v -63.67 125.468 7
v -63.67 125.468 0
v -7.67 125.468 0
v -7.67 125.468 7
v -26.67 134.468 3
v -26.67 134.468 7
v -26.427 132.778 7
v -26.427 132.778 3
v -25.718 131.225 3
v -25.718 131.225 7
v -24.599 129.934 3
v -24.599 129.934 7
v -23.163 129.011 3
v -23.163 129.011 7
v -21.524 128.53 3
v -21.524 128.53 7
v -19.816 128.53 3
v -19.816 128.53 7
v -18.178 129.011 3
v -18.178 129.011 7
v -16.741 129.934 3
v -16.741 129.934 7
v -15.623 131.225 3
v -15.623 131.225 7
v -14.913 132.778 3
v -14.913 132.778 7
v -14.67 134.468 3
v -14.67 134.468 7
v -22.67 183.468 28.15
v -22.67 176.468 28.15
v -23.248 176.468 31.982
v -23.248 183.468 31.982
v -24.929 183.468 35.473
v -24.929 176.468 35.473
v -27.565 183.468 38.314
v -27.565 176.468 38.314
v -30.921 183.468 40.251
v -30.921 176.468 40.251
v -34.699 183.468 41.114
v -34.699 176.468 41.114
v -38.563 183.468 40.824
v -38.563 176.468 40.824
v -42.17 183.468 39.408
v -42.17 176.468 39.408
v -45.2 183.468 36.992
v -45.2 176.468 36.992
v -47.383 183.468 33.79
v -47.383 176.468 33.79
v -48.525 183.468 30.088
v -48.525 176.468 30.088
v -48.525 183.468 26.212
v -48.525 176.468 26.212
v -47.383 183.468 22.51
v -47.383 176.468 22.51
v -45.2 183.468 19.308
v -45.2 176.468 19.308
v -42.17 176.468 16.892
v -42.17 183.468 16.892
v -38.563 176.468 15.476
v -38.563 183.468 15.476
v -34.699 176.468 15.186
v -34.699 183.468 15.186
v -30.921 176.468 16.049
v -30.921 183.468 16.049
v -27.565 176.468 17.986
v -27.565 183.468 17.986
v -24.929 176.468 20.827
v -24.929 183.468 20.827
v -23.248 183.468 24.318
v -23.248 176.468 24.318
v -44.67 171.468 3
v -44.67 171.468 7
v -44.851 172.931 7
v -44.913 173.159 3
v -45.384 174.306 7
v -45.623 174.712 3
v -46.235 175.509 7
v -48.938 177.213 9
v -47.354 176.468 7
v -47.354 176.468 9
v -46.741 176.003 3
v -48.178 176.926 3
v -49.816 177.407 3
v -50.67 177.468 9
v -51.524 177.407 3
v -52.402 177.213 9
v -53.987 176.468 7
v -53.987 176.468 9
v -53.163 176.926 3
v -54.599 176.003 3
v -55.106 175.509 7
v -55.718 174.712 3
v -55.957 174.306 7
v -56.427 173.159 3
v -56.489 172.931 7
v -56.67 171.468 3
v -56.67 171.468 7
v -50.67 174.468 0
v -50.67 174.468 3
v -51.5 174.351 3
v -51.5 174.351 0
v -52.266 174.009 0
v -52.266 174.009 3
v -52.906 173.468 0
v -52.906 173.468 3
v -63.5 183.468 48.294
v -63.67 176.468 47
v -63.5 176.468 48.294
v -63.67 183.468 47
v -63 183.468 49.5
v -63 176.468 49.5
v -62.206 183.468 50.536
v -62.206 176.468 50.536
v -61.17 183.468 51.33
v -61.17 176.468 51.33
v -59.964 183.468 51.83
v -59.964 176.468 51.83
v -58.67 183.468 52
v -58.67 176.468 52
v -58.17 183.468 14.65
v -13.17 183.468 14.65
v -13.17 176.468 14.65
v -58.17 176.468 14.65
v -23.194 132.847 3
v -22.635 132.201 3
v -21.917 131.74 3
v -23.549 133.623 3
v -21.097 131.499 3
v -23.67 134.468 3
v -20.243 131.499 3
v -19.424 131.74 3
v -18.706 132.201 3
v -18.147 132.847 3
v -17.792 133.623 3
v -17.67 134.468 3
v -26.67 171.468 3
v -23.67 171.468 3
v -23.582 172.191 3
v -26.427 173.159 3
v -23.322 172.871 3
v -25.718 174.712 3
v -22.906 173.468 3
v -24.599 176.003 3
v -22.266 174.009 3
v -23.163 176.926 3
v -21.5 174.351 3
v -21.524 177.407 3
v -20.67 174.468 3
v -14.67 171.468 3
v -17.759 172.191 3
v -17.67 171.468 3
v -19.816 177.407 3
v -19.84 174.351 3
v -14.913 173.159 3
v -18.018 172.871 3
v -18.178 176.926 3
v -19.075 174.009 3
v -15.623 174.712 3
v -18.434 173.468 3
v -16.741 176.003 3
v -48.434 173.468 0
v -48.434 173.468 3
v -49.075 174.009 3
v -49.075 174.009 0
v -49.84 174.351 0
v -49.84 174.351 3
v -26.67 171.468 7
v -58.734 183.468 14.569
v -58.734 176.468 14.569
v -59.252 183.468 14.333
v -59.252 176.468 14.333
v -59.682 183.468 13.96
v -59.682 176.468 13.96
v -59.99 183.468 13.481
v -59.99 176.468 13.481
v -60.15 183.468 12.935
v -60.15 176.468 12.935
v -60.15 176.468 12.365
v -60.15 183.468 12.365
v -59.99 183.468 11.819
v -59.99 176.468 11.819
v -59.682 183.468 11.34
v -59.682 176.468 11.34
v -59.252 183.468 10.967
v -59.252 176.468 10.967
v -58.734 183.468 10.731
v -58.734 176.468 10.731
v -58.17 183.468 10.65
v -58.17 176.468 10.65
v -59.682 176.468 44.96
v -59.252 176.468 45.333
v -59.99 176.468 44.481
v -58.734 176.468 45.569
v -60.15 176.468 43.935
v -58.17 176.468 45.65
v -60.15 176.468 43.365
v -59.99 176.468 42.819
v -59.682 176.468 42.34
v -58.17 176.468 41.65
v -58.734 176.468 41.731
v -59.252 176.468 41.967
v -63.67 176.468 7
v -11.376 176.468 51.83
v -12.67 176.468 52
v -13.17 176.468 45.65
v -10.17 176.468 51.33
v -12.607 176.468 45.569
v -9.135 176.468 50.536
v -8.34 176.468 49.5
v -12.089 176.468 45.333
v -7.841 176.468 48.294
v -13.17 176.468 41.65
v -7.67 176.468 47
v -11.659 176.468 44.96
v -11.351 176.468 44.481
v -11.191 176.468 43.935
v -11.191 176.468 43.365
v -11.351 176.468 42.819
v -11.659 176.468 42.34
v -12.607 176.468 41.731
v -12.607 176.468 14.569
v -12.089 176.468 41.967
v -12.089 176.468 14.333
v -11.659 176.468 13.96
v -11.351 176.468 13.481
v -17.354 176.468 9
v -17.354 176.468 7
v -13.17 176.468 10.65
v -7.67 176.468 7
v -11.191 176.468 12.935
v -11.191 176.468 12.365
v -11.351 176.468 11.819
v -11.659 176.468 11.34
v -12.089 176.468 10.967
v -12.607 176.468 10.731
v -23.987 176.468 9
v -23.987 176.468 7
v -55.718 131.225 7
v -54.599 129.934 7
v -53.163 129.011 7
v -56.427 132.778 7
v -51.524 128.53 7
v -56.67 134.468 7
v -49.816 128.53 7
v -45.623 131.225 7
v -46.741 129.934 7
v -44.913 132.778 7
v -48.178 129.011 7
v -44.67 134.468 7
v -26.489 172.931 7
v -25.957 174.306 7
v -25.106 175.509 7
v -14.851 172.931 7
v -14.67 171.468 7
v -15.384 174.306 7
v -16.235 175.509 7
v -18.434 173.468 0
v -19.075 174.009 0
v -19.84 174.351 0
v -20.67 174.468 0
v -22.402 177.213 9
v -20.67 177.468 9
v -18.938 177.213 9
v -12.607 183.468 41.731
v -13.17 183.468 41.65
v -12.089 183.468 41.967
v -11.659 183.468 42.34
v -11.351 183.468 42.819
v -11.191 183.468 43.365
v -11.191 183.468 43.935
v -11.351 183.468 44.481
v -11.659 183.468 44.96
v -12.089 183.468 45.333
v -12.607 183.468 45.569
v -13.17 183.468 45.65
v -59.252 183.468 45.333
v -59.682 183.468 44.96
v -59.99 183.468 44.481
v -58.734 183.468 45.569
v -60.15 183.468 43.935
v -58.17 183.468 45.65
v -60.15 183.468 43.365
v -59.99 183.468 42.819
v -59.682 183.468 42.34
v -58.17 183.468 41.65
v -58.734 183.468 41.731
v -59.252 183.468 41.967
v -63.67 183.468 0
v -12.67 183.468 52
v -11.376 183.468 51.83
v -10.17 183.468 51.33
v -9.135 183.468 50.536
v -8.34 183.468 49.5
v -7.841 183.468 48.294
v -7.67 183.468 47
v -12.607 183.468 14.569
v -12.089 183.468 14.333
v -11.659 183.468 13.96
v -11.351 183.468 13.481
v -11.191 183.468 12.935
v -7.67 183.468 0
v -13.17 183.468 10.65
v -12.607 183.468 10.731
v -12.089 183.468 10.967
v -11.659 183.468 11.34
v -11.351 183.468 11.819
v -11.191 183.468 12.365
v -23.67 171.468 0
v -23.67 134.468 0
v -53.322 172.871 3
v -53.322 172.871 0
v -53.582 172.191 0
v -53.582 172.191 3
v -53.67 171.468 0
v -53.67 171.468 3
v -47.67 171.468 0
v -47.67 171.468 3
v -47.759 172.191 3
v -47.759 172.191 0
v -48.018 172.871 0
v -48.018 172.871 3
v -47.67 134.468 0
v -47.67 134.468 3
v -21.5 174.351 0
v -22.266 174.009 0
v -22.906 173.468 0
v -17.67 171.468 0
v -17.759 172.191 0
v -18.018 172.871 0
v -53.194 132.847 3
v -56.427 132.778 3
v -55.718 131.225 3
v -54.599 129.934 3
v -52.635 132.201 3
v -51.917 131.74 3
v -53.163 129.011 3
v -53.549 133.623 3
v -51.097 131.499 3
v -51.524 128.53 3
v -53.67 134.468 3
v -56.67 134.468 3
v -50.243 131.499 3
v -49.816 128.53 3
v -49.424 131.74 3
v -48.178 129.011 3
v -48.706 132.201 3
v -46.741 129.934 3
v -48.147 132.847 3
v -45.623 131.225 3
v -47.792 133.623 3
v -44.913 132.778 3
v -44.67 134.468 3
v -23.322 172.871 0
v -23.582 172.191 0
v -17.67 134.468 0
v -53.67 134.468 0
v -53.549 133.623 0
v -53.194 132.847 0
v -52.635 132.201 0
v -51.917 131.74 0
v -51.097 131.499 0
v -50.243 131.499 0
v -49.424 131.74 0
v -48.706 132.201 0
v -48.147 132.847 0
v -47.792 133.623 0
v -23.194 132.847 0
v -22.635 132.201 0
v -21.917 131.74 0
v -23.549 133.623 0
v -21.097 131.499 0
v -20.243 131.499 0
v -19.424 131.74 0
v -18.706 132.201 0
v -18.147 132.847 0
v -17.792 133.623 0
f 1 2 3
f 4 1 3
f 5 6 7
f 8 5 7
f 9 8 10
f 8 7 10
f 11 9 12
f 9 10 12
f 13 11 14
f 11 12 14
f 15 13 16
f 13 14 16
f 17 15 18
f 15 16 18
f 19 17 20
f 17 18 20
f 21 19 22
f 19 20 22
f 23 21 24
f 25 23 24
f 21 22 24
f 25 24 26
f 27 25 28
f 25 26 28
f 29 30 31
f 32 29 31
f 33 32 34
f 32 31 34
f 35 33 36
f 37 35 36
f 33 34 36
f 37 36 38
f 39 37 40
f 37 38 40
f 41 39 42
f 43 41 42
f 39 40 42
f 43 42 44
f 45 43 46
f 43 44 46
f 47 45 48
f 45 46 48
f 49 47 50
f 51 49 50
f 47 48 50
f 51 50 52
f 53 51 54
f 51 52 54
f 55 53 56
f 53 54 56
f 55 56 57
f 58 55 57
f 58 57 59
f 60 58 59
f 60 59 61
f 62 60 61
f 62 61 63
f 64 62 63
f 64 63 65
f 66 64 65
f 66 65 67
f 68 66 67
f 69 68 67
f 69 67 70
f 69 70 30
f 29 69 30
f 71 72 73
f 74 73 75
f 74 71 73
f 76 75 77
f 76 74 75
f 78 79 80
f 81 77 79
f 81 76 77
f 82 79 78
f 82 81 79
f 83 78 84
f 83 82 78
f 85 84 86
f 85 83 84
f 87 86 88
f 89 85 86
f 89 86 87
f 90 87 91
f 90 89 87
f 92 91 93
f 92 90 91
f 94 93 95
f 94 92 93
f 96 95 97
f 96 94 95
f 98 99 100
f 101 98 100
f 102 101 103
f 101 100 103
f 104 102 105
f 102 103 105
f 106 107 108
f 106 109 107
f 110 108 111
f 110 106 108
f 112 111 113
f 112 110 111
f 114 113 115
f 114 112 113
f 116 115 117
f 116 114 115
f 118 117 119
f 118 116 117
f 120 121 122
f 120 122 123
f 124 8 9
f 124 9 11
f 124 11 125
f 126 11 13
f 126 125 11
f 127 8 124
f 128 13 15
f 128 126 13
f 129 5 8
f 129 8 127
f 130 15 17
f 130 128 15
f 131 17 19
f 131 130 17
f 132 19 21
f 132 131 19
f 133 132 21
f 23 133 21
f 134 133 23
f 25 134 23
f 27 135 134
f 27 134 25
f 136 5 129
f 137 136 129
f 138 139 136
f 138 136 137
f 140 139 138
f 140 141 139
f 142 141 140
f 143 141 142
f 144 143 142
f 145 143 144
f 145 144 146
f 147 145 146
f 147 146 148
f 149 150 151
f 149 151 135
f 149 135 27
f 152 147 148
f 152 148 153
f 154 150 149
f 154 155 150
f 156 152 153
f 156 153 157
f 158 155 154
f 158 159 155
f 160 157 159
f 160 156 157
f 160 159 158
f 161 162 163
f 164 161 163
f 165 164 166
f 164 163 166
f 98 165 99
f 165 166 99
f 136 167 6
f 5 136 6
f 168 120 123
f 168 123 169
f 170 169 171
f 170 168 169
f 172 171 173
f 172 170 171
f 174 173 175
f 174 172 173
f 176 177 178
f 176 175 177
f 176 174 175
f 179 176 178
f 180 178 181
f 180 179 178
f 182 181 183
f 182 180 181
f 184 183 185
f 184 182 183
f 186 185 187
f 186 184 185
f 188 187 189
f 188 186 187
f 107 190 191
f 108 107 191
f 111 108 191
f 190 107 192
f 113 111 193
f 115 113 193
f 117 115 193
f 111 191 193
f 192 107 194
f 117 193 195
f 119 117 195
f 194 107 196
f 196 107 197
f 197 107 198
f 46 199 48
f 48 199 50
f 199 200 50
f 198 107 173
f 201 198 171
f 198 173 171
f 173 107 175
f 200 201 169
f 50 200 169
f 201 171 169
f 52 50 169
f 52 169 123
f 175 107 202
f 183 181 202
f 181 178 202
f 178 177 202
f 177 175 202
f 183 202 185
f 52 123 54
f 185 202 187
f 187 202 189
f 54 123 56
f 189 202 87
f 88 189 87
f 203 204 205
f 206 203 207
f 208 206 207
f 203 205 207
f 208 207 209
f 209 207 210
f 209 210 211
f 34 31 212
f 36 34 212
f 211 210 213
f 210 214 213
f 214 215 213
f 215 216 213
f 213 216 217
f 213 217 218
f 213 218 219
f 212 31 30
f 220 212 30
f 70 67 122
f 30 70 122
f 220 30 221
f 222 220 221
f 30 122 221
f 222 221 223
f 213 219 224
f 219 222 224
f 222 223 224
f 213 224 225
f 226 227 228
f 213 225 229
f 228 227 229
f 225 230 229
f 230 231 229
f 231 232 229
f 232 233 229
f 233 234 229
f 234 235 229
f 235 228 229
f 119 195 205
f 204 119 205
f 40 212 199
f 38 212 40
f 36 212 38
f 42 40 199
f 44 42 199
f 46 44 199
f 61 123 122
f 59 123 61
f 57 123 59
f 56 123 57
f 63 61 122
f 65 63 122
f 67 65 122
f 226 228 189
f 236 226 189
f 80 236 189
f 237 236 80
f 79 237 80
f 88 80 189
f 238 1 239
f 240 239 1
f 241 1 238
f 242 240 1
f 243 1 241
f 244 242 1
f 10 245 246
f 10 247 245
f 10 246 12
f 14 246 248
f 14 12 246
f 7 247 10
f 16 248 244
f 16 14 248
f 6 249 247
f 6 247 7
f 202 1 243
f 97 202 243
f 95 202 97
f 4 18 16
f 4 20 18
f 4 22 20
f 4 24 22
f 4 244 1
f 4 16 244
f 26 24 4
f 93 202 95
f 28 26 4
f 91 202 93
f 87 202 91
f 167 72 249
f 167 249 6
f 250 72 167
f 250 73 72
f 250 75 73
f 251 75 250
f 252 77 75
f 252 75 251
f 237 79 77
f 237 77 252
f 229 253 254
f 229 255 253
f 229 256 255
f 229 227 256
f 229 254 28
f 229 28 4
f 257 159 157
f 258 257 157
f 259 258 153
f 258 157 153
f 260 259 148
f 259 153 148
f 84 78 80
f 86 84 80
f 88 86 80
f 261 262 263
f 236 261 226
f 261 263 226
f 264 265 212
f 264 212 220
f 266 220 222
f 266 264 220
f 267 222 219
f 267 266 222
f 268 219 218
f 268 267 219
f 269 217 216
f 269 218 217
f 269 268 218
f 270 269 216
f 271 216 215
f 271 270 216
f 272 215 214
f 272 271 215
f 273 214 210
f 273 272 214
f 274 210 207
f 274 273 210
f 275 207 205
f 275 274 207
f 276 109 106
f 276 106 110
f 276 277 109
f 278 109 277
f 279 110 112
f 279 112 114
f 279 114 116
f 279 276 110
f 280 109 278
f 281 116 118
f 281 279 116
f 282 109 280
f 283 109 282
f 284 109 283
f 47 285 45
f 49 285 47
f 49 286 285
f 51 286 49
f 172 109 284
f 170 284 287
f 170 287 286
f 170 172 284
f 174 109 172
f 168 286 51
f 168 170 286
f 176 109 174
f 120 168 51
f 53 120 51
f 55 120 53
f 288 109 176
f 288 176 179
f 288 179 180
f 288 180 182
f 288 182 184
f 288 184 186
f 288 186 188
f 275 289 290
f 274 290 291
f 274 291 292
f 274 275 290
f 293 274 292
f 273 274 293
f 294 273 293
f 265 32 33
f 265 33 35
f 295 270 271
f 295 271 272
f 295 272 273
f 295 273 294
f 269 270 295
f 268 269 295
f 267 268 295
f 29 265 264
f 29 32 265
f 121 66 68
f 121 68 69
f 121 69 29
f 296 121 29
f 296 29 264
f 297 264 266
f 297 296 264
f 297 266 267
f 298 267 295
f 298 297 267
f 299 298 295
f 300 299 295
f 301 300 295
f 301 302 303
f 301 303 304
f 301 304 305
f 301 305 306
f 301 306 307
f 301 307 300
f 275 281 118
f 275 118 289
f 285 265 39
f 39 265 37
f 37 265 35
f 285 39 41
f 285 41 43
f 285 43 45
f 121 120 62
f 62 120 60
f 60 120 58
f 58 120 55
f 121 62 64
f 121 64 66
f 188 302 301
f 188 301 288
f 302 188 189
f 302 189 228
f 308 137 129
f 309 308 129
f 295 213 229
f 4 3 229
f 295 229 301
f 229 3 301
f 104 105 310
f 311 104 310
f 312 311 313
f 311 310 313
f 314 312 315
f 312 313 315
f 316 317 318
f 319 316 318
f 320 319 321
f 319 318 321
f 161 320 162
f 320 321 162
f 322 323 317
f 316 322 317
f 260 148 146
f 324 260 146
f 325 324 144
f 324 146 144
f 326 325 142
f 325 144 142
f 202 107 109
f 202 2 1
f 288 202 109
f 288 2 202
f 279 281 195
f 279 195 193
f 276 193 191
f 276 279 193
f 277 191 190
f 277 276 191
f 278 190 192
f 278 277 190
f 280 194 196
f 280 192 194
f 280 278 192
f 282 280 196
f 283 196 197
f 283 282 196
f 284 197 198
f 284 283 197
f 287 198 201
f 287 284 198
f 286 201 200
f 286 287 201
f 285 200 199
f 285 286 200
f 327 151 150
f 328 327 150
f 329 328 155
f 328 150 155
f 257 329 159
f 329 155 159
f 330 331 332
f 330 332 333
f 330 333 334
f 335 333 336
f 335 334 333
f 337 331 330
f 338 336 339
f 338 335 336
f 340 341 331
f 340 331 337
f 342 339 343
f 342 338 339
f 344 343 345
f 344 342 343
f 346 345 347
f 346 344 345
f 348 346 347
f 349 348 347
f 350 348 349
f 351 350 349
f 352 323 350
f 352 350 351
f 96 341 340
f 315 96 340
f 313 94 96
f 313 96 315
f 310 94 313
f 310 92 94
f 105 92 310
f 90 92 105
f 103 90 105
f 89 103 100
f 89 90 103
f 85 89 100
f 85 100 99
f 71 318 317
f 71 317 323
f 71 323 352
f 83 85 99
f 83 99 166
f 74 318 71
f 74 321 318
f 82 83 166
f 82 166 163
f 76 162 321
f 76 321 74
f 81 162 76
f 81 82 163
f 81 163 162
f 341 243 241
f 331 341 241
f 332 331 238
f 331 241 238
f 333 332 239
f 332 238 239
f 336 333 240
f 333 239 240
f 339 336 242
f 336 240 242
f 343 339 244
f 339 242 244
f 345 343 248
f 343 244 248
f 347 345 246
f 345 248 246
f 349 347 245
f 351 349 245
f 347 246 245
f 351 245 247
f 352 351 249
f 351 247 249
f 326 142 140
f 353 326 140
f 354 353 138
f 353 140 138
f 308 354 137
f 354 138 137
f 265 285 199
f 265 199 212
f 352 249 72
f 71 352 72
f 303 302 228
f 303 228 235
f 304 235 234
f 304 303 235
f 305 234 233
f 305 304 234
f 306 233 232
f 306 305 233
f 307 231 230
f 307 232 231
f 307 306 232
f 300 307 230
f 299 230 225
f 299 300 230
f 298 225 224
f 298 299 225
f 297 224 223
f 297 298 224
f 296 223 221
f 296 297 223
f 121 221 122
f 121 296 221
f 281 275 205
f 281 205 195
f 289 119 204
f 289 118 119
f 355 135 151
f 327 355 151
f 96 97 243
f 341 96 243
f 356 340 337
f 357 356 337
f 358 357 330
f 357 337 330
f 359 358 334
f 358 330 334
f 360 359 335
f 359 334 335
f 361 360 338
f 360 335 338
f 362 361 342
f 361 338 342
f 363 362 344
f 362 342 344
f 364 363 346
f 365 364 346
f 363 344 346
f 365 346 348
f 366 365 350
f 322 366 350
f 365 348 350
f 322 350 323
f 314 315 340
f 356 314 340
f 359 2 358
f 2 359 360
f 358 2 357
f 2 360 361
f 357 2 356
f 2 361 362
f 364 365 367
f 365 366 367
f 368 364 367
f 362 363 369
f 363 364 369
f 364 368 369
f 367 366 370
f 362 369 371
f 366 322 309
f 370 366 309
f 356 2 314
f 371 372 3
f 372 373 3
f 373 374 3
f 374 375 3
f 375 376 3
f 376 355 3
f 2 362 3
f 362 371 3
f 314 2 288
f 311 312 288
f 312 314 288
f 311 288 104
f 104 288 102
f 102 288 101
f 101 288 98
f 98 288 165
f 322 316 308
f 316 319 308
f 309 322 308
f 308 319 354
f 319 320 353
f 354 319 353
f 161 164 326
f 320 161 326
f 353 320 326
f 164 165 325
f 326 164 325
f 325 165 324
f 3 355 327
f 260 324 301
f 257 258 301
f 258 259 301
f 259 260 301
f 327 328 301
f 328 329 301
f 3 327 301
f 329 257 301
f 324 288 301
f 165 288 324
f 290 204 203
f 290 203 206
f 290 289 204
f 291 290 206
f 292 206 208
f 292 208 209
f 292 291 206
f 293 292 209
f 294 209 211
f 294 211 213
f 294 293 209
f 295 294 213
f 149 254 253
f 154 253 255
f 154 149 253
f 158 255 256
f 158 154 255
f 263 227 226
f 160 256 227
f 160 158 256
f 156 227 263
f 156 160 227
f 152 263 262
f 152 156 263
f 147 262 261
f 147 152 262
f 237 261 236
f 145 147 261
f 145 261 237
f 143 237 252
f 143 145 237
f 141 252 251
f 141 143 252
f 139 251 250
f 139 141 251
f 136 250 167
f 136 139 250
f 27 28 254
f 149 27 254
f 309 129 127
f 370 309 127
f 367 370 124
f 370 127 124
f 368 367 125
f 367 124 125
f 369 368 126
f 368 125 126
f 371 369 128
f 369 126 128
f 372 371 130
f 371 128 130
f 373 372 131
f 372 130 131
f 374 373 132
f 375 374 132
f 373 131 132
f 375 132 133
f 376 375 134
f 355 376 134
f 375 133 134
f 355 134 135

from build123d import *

# Parameters (mm, degrees)
ESBO_O1_W                  = 56
ESBO_O1_H                  = 58
RESSALTO_EXTRUS_O1_DEPTH   = 7
CORTE_EXTRUS_O1_DEPTH      = 7
ESBO_O4_W                  = 56
ESBO_O4_H                  = 7
RESSALTO_EXTRUS_O2_DEPTH   = 45
ESBO_O5_R                  = 13
ESBO_O5_R_2                = 2
CORTE_EXTRUS_O2_DEPTH      = 45
CORTE_EXTRUS_O3_DEPTH      = 2
CORTE_EXTRUS_O3_DEPTH_BACK = 4
FILETE1_R                  = 5
CORTE_EXTRUS_O4_DEPTH      = 10


with BuildPart() as part:
    # Esboço1 → Ressalto-extrusão1 (new body)
    with BuildSketch(Plane.XY):
        with Locations((-35.670310893, 154.468429513)):
            Rectangle(ESBO_O1_W, ESBO_O1_H)
    extrude(amount=RESSALTO_EXTRUS_O1_DEPTH)

    # Esboço3 → Corte-extrusão1 (cut)
    with BuildSketch(Plane.XY.offset(7)):
        with BuildLine():
            Line((-47.670310893, 134.468429513), (-47.670310893, 171.468429513))
            ThreePointArc((-47.670310893, 171.468429513), (-47.867793816, 172.538895782), (-48.434242916, 173.468429513))
            ThreePointArc((-48.434242916, 173.468429513), (-49.445566022, 174.2070423), (-50.670310893, 174.468429513))
            ThreePointArc((-50.670310893, 174.468429513), (-51.895055765, 174.2070423), (-52.906378871, 173.468429513))
            ThreePointArc((-52.906378871, 173.468429513), (-53.47282797, 172.538895782), (-53.670310893, 171.468429513))
            Line((-53.670310893, 171.468429513), (-53.670310893, 134.468429513))
            ThreePointArc((-53.670310893, 134.468429513), (-50.670310893, 131.468429513), (-47.670310893, 134.468429513))
        make_face()
        with BuildLine():
            Line((-23.670310893, 171.468429513), (-23.670310893, 134.468429513))
            ThreePointArc((-23.670310893, 134.468429513), (-20.670310893, 131.468429513), (-17.670310893, 134.468429513))
            Line((-17.670310893, 134.468429513), (-17.670310893, 171.468429513))
            ThreePointArc((-17.670310893, 171.468429513), (-17.867793816, 172.538895782), (-18.434242916, 173.468429513))
            ThreePointArc((-18.434242916, 173.468429513), (-19.445566022, 174.2070423), (-20.670310893, 174.468429513))
            ThreePointArc((-20.670310893, 174.468429513), (-21.895055765, 174.2070423), (-22.906378871, 173.468429513))
            ThreePointArc((-22.906378871, 173.468429513), (-23.47282797, 172.538895782), (-23.670310893, 171.468429513))
        make_face()
    extrude(amount=-CORTE_EXTRUS_O1_DEPTH, mode=Mode.SUBTRACT)

    # Esboço4 → Ressalto-extrusão2 (add)
    with BuildSketch(Plane.XY.offset(7)):
        with Locations((-35.670310893, 179.968429513)):
            Rectangle(ESBO_O4_W, ESBO_O4_H)
    extrude(amount=RESSALTO_EXTRUS_O2_DEPTH)

    # Esboço5 → Corte-extrusão2 (cut)
    with BuildSketch(Plane.XZ.offset(-176.468429513)):
        with Locations((-35.670310893, 28.15)):
            Circle(ESBO_O5_R)
        with Locations((-51.170310893, 43.65)):
            Circle(ESBO_O5_R_2)
        with Locations((-20.170310893, 43.65)):
            Circle(ESBO_O5_R_2)
        with Locations((-51.170310893, 12.65)):
            Circle(ESBO_O5_R_2)
        with Locations((-20.170310893, 12.65)):
            Circle(ESBO_O5_R_2)
    extrude(amount=-CORTE_EXTRUS_O2_DEPTH, mode=Mode.SUBTRACT)

    # Esboço6 → Corte-extrusão3 (cut, two sides)
    with BuildSketch(Plane.XY.offset(7)) as corte_extrus_o3_sk:
        with BuildLine():
            Line((-56.670310893, 171.468429513), (-56.670310893, 134.468429513))
            ThreePointArc((-56.670310893, 134.468429513), (-50.670310893, 128.468429513), (-44.670310893, 134.468429513))
            Line((-44.670310893, 134.468429513), (-44.670310893, 171.468429513))
            ThreePointArc((-44.670310893, 171.468429513), (-50.670310893, 177.468429513), (-56.670310893, 171.468429513))
        make_face()
        with BuildLine():
            Line((-14.670310893, 134.468429513), (-14.670310893, 171.468429513))
            ThreePointArc((-14.670310893, 171.468429513), (-20.670310893, 177.468429513), (-26.670310893, 171.468429513))
            Line((-26.670310893, 171.468429513), (-26.670310893, 134.468429513))
            ThreePointArc((-26.670310893, 134.468429513), (-20.670310893, 128.468429513), (-14.670310893, 134.468429513))
        make_face()
    extrude(amount=CORTE_EXTRUS_O3_DEPTH, mode=Mode.SUBTRACT)
    extrude(corte_extrus_o3_sk.sketch, amount=-CORTE_EXTRUS_O3_DEPTH_BACK, mode=Mode.SUBTRACT)

    # Filete1
    filete1_edges = [part.edges().sort_by_distance(p)[0] for p in [
        (-63.670310893, 179.968429513, 52),
        (-7.670310893, 179.968429513, 52),
    ]]
    fillet(filete1_edges, radius=FILETE1_R)

    # Esboço7 → Corte-extrusão4 (cut)
    with BuildSketch(Plane(origin=(0, 183.468429513, 0), x_dir=(1, 0, 0), z_dir=(0, 1, 0))):
        with BuildLine():
            Line((-58.170310893, -10.65), (-13.170310893, -10.65))
            ThreePointArc((-13.170310893, -10.65), (-11.170310893, -12.65), (-13.170310893, -14.65))
            Line((-13.170310893, -14.65), (-58.170310893, -14.65))
            ThreePointArc((-58.170310893, -14.65), (-60.170310893, -12.65), (-58.170310893, -10.65))
        make_face()
        with BuildLine():
            Line((-13.170310893, -45.65), (-58.170310893, -45.65))
            ThreePointArc((-58.170310893, -45.65), (-60.170310893, -43.65), (-58.170310893, -41.65))
            Line((-58.170310893, -41.65), (-13.170310893, -41.65))
            ThreePointArc((-13.170310893, -41.65), (-11.170310893, -43.65), (-13.170310893, -45.65))
        make_face()
    extrude(amount=-CORTE_EXTRUS_O4_DEPTH, mode=Mode.SUBTRACT)


solid = part.part
